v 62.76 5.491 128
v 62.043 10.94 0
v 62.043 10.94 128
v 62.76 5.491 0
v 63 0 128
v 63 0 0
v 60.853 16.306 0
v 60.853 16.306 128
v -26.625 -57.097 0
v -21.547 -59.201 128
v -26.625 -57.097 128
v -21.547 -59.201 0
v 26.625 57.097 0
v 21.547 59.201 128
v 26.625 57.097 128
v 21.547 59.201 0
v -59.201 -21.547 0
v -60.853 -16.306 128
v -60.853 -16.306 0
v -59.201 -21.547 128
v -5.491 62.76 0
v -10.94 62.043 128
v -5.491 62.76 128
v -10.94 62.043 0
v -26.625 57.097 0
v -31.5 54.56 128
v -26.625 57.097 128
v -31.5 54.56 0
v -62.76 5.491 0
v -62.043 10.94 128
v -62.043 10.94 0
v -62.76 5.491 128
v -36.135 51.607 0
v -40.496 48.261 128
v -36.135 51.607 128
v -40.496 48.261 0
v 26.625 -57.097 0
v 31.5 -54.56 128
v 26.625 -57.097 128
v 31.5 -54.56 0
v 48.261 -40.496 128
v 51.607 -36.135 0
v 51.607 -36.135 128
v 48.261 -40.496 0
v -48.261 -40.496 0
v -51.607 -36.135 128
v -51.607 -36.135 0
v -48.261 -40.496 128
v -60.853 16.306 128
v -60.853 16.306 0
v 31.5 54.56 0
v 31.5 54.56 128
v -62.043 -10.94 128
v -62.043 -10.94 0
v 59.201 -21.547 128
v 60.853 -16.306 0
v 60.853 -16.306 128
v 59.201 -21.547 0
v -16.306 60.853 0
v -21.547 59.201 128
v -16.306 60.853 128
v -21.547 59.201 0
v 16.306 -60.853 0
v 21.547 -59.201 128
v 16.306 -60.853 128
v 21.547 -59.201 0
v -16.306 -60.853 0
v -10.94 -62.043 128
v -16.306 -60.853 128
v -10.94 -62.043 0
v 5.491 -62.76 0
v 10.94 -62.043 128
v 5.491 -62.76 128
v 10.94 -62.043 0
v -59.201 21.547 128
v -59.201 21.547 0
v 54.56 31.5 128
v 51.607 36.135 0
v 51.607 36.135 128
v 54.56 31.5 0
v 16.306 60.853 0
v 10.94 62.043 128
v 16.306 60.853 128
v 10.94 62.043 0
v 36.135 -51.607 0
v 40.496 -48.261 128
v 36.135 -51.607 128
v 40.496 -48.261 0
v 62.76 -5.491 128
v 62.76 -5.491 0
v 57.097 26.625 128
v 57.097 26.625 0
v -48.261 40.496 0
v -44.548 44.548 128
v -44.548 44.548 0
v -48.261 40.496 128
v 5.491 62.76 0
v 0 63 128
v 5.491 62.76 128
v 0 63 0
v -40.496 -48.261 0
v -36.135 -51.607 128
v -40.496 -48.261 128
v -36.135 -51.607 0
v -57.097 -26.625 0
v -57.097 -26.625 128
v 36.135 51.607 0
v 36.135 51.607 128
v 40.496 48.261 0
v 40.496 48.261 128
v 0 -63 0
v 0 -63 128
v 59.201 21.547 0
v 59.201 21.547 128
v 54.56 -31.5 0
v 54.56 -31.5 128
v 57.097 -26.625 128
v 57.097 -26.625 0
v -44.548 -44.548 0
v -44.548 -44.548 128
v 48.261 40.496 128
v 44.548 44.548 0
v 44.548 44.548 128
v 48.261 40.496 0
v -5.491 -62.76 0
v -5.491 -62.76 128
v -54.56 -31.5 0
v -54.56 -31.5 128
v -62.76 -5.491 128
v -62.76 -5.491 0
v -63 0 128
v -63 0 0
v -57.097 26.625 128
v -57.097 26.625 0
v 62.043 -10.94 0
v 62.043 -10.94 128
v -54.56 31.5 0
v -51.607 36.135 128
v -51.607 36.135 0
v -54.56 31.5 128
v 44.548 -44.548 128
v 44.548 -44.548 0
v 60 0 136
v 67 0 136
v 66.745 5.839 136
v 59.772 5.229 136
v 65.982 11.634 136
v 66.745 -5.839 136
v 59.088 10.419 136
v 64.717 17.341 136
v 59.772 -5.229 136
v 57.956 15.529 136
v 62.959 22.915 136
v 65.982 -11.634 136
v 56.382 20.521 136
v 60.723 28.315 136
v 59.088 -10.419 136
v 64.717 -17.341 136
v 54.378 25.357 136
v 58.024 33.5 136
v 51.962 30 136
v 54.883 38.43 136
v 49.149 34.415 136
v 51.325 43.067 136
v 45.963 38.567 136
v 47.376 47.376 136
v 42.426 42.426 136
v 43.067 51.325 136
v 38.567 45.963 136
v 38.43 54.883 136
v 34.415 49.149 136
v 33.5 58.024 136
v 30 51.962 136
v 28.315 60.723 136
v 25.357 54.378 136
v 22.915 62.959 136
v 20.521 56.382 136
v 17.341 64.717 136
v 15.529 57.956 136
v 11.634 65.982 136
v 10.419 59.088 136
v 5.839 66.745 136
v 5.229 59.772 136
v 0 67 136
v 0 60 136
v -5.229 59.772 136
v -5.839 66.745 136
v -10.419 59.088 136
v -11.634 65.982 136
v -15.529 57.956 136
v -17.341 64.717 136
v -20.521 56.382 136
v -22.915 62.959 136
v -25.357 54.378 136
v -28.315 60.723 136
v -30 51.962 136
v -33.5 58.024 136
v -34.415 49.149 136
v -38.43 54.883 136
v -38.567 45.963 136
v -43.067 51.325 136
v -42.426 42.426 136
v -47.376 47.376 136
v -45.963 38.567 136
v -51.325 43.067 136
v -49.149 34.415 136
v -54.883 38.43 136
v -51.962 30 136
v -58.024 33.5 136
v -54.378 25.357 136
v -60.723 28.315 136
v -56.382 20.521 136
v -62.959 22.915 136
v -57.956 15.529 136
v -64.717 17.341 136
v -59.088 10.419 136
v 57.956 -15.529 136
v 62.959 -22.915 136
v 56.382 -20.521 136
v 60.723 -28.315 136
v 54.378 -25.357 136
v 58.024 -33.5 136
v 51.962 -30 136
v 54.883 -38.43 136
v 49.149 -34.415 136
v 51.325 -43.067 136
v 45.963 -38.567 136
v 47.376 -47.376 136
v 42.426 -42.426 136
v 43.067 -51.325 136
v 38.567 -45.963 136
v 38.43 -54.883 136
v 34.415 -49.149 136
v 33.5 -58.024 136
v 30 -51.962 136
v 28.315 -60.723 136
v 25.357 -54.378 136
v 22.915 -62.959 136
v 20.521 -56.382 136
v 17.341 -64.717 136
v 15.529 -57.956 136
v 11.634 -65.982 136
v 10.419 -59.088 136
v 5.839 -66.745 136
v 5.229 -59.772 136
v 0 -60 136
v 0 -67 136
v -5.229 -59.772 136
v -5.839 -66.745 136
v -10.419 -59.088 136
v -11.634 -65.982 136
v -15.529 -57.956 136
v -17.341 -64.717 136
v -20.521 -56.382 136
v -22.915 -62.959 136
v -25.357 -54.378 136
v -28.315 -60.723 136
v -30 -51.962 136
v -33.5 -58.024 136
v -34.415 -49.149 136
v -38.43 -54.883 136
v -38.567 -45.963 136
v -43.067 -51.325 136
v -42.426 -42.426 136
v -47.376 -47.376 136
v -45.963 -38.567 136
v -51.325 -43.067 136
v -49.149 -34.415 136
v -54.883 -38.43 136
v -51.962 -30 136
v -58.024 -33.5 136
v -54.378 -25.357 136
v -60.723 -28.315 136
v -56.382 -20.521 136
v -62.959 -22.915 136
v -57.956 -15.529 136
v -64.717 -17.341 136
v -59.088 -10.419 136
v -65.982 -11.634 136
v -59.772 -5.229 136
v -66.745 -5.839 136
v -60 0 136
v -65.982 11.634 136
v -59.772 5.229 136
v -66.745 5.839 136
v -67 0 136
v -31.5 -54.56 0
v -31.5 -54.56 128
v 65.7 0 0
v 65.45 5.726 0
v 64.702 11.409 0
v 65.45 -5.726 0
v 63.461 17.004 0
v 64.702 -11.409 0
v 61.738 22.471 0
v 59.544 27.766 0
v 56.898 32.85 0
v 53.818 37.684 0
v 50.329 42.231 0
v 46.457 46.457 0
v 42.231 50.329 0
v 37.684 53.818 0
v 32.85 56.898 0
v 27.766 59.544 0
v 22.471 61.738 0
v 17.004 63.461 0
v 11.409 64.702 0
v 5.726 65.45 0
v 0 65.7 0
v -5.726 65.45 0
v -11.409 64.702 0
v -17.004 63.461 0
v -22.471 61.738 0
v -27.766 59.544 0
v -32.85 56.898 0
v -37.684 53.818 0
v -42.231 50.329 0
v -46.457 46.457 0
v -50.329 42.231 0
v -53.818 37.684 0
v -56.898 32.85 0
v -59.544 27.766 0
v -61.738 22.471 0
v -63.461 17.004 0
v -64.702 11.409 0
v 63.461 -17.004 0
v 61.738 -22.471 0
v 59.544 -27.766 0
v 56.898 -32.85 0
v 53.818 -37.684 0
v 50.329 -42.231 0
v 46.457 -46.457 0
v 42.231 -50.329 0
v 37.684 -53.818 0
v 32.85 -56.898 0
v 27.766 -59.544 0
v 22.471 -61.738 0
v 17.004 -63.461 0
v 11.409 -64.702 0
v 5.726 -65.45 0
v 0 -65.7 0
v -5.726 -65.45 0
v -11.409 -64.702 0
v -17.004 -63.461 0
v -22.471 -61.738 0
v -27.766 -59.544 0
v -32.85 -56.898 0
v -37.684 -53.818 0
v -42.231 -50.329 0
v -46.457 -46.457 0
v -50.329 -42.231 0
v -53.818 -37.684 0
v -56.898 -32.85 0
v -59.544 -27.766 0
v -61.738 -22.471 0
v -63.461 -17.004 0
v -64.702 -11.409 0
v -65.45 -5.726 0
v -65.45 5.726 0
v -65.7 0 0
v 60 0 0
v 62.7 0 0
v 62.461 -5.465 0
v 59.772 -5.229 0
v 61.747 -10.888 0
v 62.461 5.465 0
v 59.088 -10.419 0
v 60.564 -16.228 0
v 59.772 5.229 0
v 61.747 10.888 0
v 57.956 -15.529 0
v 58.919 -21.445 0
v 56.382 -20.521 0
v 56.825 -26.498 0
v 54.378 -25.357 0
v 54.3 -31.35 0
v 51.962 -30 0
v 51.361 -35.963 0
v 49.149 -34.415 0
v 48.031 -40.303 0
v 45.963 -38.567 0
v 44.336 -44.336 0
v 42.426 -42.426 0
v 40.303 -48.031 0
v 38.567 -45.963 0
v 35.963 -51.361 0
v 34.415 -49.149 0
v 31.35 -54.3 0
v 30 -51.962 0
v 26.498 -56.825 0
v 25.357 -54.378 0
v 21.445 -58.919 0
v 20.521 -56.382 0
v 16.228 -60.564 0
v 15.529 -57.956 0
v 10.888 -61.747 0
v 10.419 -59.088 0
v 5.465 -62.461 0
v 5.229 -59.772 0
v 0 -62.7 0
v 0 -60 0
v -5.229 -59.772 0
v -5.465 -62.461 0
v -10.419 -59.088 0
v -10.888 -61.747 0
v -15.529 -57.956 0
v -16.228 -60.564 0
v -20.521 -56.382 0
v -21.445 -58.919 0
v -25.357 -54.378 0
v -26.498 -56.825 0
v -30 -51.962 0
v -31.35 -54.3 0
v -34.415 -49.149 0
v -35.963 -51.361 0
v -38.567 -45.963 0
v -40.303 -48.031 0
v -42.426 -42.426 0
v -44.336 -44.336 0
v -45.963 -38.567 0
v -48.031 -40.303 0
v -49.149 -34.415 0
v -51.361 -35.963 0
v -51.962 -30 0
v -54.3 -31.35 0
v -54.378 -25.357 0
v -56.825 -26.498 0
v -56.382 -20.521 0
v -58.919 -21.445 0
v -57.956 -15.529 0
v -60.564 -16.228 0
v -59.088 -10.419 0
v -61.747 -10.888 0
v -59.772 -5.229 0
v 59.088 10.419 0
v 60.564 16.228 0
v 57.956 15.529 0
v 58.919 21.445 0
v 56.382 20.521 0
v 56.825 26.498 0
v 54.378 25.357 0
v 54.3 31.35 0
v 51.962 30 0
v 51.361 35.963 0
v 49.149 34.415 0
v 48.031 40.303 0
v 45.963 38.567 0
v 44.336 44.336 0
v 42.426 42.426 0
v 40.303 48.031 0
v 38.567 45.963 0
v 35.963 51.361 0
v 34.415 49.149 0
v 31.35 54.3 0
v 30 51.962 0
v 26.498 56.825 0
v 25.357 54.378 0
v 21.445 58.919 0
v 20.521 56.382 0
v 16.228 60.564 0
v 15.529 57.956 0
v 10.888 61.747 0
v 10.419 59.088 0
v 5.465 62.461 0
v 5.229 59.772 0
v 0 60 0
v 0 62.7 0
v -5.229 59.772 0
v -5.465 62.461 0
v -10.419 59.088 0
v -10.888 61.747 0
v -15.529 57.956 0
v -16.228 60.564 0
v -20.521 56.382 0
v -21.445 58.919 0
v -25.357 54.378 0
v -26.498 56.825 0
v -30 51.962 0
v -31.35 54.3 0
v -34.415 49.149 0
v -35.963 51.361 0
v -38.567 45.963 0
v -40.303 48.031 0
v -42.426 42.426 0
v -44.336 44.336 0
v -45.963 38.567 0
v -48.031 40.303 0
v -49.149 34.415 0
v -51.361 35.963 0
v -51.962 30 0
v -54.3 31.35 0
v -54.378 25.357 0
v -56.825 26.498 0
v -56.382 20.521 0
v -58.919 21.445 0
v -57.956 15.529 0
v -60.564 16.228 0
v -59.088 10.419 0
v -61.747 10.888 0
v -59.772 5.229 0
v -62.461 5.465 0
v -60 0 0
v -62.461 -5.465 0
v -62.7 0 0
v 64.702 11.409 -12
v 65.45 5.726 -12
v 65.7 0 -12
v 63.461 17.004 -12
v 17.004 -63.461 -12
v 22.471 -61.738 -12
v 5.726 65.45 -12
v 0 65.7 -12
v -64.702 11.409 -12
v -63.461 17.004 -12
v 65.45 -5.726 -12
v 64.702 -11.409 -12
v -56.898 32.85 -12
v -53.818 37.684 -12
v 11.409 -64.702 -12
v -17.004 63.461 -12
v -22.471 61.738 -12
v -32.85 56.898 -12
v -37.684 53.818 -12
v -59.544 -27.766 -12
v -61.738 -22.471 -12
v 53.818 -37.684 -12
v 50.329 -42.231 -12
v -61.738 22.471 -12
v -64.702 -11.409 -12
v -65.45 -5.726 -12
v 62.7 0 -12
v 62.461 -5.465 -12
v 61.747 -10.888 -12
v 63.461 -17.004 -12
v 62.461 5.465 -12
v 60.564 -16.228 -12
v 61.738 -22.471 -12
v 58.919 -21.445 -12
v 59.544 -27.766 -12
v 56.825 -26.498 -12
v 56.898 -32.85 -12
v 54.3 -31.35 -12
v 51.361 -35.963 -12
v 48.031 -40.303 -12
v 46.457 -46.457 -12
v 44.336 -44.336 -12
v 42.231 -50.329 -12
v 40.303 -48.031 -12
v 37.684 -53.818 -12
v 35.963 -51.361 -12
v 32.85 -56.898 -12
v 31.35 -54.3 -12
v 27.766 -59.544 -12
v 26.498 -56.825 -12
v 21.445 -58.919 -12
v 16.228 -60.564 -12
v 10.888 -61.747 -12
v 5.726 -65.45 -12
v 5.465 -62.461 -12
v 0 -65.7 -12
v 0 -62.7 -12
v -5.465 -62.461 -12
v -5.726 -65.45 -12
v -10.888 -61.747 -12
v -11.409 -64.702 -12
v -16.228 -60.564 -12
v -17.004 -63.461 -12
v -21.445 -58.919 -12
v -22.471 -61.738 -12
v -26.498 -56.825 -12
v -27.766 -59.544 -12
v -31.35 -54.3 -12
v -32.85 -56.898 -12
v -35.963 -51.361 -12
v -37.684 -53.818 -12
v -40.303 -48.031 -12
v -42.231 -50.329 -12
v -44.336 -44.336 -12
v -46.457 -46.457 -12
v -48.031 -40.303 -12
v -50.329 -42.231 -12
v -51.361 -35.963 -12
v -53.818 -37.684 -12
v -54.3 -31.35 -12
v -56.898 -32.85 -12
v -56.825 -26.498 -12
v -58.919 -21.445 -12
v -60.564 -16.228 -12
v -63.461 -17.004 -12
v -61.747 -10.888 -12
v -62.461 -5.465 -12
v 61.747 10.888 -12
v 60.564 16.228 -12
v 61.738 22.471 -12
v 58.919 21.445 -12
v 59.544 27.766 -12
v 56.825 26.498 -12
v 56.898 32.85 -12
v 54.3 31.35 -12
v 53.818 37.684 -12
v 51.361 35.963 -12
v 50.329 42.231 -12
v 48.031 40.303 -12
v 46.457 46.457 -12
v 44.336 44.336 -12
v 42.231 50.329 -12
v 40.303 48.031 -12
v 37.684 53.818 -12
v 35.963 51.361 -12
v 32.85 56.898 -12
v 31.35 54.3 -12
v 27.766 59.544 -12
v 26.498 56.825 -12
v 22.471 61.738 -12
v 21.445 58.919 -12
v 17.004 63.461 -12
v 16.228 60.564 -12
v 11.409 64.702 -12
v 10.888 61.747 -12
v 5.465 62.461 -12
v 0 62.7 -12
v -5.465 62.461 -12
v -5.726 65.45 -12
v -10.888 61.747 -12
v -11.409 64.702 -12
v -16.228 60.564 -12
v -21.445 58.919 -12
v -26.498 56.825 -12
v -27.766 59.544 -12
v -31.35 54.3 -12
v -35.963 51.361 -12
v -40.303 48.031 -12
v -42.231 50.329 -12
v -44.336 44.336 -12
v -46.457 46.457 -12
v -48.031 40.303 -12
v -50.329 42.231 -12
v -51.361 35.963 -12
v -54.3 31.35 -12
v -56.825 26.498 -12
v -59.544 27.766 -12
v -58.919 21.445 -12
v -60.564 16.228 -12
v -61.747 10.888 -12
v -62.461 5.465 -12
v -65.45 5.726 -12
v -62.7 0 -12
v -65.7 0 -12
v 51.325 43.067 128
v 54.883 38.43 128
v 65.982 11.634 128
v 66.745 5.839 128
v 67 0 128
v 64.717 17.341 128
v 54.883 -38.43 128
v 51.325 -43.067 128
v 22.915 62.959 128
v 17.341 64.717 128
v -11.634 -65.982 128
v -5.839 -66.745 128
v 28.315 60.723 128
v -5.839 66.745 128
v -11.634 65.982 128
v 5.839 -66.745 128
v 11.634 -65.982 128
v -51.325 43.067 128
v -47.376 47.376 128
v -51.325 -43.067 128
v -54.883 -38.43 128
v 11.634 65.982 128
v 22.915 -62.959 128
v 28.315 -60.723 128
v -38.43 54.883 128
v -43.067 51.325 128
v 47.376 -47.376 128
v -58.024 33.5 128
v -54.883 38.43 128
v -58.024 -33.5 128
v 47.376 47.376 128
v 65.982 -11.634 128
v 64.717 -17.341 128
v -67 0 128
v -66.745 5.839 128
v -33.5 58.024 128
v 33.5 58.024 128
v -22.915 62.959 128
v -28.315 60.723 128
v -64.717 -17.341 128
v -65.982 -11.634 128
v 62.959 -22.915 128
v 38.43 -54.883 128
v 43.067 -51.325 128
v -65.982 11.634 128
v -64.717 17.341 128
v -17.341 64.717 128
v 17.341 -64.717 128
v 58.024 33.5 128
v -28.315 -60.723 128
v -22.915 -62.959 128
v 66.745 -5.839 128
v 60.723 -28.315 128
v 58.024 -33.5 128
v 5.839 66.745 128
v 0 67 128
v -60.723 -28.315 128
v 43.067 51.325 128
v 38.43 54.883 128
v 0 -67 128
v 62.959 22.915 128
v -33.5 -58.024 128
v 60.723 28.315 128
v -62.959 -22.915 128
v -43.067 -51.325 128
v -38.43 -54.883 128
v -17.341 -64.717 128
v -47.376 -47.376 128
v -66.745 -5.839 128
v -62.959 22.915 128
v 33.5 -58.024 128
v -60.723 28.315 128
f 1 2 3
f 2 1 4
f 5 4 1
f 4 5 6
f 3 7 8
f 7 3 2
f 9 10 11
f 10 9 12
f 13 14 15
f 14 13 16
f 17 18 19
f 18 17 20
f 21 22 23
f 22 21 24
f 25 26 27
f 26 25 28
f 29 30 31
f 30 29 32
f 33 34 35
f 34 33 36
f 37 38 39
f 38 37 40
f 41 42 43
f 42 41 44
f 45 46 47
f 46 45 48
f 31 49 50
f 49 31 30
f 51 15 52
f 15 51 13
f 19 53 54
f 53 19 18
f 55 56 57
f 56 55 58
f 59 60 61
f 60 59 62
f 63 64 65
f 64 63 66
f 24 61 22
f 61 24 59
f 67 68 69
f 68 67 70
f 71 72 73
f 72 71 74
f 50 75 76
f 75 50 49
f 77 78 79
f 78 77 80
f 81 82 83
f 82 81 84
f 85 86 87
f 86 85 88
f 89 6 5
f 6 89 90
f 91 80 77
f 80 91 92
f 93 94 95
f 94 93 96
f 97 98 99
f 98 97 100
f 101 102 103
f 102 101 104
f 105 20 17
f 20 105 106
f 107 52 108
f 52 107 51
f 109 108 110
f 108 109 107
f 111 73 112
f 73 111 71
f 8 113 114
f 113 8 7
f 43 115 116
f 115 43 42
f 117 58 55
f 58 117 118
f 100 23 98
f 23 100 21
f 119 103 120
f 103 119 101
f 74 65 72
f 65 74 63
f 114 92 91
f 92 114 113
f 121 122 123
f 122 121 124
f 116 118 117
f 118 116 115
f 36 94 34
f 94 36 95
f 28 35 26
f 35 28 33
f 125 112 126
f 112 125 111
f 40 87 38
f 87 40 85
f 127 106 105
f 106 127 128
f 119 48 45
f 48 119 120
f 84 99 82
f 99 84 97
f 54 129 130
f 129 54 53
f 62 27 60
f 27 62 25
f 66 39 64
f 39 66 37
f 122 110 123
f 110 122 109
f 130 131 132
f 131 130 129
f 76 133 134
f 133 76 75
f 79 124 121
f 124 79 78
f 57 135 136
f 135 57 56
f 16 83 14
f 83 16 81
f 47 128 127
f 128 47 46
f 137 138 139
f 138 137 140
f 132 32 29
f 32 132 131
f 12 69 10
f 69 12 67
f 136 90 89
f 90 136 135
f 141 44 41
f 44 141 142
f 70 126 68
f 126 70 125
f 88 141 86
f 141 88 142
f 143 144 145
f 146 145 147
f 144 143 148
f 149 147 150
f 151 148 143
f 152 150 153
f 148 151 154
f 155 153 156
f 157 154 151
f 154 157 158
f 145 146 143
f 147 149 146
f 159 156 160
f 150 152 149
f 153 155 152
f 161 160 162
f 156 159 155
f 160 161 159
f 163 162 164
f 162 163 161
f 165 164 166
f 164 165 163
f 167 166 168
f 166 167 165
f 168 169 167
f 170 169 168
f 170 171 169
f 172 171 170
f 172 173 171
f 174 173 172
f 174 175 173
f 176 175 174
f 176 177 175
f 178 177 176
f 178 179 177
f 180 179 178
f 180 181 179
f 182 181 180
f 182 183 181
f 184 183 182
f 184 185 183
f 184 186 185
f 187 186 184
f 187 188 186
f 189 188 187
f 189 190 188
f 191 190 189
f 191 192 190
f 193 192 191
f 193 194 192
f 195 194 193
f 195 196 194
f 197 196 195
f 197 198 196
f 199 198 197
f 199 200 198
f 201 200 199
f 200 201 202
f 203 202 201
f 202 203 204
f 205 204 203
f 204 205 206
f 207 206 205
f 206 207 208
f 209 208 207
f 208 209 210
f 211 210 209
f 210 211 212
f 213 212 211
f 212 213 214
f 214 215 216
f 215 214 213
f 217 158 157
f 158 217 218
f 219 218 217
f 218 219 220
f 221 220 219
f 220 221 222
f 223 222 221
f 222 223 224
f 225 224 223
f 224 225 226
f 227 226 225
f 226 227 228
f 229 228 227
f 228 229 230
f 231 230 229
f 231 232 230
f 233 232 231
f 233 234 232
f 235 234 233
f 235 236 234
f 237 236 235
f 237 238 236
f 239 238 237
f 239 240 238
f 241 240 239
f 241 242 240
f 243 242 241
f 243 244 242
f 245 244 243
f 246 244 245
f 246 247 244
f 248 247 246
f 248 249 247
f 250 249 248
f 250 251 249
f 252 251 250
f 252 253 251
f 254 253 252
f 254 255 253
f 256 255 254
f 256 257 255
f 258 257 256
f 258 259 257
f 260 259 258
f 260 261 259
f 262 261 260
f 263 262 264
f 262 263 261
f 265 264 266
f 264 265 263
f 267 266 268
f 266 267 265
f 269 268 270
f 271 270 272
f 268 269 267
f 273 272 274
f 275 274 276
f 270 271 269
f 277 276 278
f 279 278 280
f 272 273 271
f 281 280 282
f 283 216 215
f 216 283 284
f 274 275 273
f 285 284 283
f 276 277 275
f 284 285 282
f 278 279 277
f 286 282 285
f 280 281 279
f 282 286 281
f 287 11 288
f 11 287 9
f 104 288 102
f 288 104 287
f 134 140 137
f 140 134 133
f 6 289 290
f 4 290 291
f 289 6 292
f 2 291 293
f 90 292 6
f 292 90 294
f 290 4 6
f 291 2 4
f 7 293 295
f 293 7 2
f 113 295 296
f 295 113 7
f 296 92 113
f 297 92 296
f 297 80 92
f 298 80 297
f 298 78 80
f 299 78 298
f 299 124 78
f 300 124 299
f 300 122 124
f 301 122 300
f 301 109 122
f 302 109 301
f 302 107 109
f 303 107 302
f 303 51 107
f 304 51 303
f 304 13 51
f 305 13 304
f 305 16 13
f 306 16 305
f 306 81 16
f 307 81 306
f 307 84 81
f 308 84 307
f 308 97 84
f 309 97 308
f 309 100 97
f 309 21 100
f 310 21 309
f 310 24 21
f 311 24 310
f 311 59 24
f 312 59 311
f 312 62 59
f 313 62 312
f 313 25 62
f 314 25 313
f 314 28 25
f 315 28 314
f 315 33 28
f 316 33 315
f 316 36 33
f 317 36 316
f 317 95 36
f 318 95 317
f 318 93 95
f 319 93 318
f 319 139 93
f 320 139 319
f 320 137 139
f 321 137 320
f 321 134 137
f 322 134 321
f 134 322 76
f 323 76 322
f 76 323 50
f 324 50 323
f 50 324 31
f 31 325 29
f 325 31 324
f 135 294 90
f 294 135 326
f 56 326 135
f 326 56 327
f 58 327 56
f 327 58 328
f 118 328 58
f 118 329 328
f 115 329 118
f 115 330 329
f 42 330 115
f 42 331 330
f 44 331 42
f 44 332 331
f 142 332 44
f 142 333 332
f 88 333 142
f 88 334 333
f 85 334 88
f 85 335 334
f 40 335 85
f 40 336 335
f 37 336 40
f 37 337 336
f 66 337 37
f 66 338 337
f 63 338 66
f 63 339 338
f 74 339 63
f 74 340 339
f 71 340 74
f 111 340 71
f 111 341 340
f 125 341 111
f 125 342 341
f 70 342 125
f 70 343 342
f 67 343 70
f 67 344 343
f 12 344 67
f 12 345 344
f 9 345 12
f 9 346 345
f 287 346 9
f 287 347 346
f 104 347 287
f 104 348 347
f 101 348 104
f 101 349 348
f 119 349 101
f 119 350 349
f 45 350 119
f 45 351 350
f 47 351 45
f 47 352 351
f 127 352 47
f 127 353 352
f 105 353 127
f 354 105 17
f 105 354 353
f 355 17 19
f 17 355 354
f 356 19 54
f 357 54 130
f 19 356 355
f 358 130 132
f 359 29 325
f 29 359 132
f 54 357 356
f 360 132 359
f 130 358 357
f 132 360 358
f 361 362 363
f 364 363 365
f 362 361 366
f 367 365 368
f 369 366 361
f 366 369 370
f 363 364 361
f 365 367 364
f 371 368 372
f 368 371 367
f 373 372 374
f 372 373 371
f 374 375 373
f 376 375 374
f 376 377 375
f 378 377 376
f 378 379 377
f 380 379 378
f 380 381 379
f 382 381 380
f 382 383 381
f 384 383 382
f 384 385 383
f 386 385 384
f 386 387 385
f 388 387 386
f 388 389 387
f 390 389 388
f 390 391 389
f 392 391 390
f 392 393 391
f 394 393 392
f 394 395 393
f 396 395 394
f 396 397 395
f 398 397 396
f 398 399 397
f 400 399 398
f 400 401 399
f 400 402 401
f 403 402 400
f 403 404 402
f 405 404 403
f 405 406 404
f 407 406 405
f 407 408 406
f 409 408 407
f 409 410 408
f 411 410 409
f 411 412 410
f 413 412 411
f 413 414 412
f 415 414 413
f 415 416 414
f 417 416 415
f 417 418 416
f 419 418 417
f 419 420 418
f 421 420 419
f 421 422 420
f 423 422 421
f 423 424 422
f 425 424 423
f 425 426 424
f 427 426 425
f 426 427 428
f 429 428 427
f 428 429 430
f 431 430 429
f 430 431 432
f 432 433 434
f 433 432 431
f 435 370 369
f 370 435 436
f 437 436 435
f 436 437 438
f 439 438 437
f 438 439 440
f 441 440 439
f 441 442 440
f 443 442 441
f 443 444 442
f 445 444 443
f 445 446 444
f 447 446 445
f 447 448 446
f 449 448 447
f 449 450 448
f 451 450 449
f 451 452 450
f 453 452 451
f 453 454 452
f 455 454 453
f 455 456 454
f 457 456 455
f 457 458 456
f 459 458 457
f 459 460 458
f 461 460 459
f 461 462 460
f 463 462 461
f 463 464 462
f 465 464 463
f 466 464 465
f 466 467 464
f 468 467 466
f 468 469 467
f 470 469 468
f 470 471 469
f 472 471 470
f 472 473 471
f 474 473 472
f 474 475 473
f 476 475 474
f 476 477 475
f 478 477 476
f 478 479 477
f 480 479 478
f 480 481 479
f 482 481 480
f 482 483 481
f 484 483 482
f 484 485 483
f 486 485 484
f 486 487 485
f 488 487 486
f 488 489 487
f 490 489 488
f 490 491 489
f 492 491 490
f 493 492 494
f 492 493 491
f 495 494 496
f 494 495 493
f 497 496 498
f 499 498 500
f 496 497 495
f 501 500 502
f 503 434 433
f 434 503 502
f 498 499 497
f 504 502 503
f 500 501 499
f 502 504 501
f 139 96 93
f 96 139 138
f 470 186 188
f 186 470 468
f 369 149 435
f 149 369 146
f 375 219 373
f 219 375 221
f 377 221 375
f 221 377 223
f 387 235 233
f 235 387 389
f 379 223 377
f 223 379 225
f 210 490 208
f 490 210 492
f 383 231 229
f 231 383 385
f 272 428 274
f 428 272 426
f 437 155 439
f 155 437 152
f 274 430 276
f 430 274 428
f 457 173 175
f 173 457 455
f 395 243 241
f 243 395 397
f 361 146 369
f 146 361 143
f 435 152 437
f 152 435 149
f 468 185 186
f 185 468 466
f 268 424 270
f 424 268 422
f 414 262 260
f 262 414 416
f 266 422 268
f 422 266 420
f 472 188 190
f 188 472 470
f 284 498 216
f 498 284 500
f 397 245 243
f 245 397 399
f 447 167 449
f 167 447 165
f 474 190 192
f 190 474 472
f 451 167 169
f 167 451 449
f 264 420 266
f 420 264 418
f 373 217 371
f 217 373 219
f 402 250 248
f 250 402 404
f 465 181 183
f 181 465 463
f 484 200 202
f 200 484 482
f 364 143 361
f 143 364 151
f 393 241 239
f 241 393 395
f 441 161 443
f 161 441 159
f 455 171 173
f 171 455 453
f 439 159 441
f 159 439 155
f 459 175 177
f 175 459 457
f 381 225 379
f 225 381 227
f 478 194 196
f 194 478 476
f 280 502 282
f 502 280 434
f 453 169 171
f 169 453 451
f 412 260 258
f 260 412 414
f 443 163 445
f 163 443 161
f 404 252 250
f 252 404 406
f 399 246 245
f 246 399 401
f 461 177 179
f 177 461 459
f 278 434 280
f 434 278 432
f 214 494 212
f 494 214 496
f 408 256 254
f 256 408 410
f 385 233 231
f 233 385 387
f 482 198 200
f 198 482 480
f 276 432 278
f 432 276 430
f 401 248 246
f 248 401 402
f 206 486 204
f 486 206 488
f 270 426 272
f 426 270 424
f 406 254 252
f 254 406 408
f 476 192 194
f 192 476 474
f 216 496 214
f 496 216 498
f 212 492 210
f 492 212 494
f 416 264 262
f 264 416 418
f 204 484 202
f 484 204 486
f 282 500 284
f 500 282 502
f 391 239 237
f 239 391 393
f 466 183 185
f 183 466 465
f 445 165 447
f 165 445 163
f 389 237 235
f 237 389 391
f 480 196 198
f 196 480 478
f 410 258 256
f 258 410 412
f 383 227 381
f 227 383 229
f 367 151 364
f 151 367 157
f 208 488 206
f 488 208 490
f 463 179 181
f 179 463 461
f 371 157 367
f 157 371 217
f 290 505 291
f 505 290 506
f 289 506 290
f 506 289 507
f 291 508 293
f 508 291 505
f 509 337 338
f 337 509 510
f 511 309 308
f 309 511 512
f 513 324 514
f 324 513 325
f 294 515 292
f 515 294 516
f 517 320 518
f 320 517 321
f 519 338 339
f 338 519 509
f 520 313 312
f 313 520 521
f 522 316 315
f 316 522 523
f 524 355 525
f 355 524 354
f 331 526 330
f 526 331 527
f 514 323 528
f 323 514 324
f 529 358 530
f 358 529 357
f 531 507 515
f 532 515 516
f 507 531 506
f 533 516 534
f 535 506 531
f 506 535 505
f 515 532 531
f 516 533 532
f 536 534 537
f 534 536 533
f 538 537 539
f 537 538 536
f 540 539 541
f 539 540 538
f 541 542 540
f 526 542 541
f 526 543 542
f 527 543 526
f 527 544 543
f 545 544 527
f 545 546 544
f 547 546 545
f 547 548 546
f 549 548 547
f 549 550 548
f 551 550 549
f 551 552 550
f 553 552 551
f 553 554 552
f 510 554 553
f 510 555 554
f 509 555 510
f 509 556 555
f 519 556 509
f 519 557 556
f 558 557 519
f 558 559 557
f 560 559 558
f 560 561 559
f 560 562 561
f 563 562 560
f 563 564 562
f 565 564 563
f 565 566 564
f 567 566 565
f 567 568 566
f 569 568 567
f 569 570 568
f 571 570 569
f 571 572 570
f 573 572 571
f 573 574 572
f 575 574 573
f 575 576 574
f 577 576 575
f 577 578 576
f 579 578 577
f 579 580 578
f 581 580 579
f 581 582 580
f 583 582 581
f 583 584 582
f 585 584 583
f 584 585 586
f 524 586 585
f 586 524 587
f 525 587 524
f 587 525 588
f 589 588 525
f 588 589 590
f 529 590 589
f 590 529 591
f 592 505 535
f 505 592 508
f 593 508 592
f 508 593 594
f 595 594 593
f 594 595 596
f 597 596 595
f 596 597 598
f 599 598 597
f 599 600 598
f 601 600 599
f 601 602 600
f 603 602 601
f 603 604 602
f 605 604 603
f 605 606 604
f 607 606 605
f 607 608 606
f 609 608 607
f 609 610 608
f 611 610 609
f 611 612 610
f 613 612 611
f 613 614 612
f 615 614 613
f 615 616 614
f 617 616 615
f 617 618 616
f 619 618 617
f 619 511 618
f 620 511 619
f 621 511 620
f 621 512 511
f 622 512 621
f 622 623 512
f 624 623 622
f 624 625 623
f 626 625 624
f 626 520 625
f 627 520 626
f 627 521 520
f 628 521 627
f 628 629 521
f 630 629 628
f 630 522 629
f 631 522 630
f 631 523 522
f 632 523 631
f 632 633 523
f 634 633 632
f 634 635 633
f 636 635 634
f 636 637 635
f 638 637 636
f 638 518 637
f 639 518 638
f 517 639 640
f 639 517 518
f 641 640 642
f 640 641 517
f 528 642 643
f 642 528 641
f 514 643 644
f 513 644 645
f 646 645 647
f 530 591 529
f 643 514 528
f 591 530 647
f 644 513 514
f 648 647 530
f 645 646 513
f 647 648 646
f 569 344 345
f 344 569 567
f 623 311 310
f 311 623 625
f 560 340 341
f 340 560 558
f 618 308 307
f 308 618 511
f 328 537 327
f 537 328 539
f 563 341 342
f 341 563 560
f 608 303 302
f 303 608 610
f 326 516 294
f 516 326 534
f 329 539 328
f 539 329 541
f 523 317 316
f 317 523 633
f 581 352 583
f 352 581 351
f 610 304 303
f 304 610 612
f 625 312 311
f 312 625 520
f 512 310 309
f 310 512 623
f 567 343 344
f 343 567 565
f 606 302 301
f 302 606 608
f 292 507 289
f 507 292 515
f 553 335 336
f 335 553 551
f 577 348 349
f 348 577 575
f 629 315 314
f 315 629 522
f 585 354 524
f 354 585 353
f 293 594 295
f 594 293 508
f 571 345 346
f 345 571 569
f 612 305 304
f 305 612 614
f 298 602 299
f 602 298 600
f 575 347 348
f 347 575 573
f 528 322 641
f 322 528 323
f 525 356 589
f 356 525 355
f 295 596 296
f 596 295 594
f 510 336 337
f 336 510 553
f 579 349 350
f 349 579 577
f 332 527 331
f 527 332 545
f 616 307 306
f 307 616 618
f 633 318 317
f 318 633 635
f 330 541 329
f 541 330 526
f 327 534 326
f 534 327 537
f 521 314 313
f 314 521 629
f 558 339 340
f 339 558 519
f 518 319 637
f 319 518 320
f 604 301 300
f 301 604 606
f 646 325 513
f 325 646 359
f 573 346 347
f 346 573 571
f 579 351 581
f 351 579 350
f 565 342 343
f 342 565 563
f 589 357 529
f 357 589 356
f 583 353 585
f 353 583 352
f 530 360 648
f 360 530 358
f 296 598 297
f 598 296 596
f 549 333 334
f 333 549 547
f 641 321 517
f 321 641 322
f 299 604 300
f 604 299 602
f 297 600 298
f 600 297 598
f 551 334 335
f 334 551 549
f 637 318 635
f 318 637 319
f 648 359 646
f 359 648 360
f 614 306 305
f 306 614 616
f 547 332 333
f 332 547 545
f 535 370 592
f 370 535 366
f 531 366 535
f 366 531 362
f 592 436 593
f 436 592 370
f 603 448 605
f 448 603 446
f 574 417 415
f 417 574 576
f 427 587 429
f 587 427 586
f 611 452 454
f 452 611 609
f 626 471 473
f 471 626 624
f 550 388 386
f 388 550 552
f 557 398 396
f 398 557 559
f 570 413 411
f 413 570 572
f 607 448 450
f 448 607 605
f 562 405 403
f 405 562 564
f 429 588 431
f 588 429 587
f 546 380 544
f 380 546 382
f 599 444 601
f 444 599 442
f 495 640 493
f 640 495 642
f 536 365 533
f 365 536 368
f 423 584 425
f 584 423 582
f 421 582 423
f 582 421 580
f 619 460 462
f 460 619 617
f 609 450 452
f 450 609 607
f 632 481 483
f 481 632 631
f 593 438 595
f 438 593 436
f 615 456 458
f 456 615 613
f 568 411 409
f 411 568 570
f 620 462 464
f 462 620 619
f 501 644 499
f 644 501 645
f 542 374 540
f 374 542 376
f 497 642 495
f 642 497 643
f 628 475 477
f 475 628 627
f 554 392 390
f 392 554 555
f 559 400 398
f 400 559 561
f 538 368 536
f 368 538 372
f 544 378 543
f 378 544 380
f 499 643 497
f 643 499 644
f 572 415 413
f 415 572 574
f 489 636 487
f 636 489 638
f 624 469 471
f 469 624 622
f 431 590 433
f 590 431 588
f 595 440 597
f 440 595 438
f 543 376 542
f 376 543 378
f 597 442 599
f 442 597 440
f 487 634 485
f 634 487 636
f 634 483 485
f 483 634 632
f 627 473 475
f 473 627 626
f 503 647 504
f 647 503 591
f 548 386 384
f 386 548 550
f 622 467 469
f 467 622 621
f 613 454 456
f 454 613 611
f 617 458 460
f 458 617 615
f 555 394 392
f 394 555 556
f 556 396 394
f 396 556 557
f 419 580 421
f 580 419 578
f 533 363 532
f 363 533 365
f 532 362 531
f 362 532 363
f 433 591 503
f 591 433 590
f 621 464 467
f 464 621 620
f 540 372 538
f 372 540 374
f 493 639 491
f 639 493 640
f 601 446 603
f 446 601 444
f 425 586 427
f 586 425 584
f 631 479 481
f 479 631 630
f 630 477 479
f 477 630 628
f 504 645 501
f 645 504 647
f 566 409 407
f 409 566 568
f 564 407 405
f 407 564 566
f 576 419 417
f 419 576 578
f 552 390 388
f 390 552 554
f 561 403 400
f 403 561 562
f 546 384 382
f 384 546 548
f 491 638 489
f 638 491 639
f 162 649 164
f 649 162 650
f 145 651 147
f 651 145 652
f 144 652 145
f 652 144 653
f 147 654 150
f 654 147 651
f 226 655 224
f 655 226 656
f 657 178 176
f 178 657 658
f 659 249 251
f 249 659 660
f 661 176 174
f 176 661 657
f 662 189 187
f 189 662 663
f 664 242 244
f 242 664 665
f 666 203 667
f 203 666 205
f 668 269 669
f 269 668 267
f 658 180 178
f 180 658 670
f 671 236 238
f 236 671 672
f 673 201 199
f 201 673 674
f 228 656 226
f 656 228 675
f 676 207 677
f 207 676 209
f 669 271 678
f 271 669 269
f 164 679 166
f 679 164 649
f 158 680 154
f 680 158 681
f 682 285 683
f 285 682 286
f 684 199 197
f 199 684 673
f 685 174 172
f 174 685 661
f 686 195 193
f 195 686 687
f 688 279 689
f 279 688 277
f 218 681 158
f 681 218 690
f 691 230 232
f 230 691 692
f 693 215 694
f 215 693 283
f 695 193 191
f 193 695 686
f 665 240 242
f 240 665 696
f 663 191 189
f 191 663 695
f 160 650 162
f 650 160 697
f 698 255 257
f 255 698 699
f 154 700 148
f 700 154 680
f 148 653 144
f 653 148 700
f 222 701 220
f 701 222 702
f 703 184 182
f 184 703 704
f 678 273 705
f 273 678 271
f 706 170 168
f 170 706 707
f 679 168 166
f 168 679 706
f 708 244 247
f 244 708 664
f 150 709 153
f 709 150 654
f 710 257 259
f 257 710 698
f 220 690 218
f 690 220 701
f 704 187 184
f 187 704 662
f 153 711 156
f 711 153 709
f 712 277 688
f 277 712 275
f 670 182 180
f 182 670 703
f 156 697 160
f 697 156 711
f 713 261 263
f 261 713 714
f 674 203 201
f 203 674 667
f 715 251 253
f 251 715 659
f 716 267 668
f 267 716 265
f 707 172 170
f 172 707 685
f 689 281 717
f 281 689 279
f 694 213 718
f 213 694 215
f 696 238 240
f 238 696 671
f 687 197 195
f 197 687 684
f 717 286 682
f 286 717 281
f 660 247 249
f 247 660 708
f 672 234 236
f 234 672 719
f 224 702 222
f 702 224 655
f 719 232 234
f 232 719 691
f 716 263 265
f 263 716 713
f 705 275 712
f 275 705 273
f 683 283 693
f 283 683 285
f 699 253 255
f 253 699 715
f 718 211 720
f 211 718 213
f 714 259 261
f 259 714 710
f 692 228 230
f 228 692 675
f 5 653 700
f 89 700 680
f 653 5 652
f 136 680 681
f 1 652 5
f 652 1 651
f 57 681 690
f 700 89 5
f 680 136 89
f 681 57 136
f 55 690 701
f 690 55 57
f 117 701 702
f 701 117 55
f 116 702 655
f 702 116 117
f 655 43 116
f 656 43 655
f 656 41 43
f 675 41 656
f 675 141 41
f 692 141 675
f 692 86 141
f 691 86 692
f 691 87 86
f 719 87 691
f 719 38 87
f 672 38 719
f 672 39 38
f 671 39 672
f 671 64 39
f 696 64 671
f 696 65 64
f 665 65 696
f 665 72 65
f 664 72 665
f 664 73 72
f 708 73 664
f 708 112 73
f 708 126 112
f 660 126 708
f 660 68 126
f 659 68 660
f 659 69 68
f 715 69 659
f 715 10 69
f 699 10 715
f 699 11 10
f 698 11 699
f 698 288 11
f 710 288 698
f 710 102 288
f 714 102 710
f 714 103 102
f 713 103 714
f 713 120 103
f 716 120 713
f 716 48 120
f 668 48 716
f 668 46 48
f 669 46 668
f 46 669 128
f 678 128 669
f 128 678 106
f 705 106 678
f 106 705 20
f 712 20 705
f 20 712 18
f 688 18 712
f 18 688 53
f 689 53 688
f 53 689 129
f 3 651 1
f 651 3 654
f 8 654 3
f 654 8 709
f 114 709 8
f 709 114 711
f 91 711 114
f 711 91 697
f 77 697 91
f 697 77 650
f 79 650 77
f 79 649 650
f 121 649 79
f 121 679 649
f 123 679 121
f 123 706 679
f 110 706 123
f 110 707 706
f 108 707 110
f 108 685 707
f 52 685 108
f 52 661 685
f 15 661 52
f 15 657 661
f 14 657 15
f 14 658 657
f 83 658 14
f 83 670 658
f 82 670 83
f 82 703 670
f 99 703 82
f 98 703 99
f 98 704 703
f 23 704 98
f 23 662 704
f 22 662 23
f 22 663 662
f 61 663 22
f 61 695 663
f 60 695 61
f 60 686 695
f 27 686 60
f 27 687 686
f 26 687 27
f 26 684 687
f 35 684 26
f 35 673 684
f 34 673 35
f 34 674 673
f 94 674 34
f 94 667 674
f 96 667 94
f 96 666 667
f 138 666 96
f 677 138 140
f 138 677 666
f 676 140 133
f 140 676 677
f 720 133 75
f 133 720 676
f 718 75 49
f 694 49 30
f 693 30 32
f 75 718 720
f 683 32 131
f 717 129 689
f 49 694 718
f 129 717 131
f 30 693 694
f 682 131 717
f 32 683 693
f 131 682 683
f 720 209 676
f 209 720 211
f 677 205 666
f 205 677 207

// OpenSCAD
// ===========================================================================
// HULL-FRAME COORDINATE STANDARD - Rev R1 (2026-06-11).  See CLAUDE.md.
//   Hull frame (canonical for ALL design artifacts): X = +port (left),
//   Y = +aft (back), Z = +dorsal (up); origin = SerenityAssembly.FCStd
//   world origin.  Primary-component STLs published to airframe/stls/
//   are stored directly in hull frame, baked by tools/bake_hull_frame.py
//   (marker 'SerenityUAV HULL-FRAME R1' in the binary STL header).
//   NEVER re-bake a mesh derived from an already-baked file.
//   This file:
//     Part-local frame.  DEFERRED - Phase 11 (aft fuselage EDF).  On
//     integration, position in hull frame per the validated assembly and
//     bake or place explicitly; stations quoted from nose convert to hull
//     Y via nose tip at hull Y = -305.6 mm.
// ===========================================================================
// s_edf_120_thrust_tube.scad
// Thrust tube for Serenity Rev N 120mm rear EDF.
//
// Remixed from Thingiverse thing:2838324 (120mm fuselage EDF).
// This tube channels exhaust from the EDF exit face through the
// aft fuselage (station ~440mm) to the rear iris nozzle (station ~600mm).
//
// Coordinate system: +Z = aft (exhaust direction).
// Z=0 = forward face of thrust tube (mates to EDF casing aft lip / motor mount ring).
// Z=TUBE_L = aft bonding face (mates to rear_nozzle_frame.stl base ring).
//
// Integration interfaces:
//   Forward (Z=0):     forward spigot ID = EDF casing OD; locates tube on EDF exit.
//   Aft (Z=TUBE_L):    bonding flange ring bonds to rear_nozzle_frame.stl base.
//
// Station reference (world X coordinates of s_rear_shell24_2mm_repaired.stl):
//   EDF exhaust face at X ≈ -90 mm (in cargo section, per plenum design).
//   Nozzle frame shoulder at X = -226 mm (= aft face -246 + seat depth 20).
//   Required span: 226 - 90 = 136 mm → TUBE_L = 136 mm.
//
//   Rev B (2026-06-02): corrected TUBE_L from 155 mm to 136 mm.
//   Previous value was 19 mm too long; tube end overshot the nozzle shoulder.
//
// Print: PETG, 0.20mm layers, 20% gyroid infill.
// Note: orient with tube axis vertical on printer for best layer adhesion.
// No support required if printed tube-axis vertical.

// ── Geometry parameters ────────────────────────────────────────────────────

BORE_ID      = 120;   // [mm] internal bore (matches EDF fan bore)
WALL         =   3;   // [mm] tube wall thickness → OD = BORE_ID + 2×WALL
TUBE_L       = 136;   // [mm] total tube length (EDF exhaust X≈-90 to nozzle shoulder X=-226)

// Forward spigot: thin sleeve that slips over the EDF casing aft OD
// The EDF casing outer diameter is nominally ~125mm (varies by brand);
// adjust SPIGOT_ID if your 120mm EDF casing OD differs.
EDF_CASING_OD = 125;  // [mm] EDF casing outer diameter — adjust to match actual unit
SPIGOT_ID     = EDF_CASING_OD + 0.4; // slip-fit clearance
SPIGOT_WALL   =   3;  // [mm] spigot sleeve wall
SPIGOT_L      =  12;  // [mm] spigot engagement length (overlaps EDF casing)

// Aft bonding flange: widens to grip against rear_nozzle_frame.stl base ring.
// rear_nozzle_frame base ring inner bore is assumed ~128mm — verify in slicer.
FLANGE_OD     = 134;  // [mm] bonding flange outer diameter
FLANGE_L      =   8;  // [mm] axial depth of bonding flange

// Lightening slots in tube wall (optional aero/mass reduction — set to 0 to disable)
SLOT_COUNT    =   0;  // number of axial slots in tube wall (0 = solid tube)
SLOT_W        =   8;  // [mm] slot width
SLOT_L        = 100;  // [mm] slot length (centred on tube)

$fn = 72;

// ── Derived values ─────────────────────────────────────────────────────────

TUBE_OD = BORE_ID + 2 * WALL;          // = 126mm
SPIGOT_OD = SPIGOT_ID + 2 * SPIGOT_WALL;

// ── Modules ────────────────────────────────────────────────────────────────

module main_tube() {
    difference() {
        cylinder(h = TUBE_L, r = TUBE_OD / 2);
        // bore
        translate([0, 0, -0.5])
            cylinder(h = TUBE_L + 1, r = BORE_ID / 2);
        // axial lightening slots
        if (SLOT_COUNT > 0)
            for (i = [0 : SLOT_COUNT - 1])
                rotate([0, 0, i * 360 / SLOT_COUNT])
                translate([TUBE_OD / 2 - WALL / 2, 0, TUBE_L / 2])
                    cube([WALL + 1, SLOT_W, SLOT_L], center = true);
    }
}

module forward_spigot() {
    // sleeve at Z=0 end that overlaps EDF casing aft lip
    difference() {
        cylinder(h = SPIGOT_L, r = SPIGOT_OD / 2);
        // inner bore clears EDF casing
        translate([0, 0, -0.5])
            cylinder(h = SPIGOT_L + 1, r = SPIGOT_ID / 2);
    }
}

module aft_bonding_flange() {
    // thickened ring at aft end for epoxy bond to rear_nozzle_frame base ring
    translate([0, 0, TUBE_L - FLANGE_L])
    difference() {
        cylinder(h = FLANGE_L, r = FLANGE_OD / 2);
        translate([0, 0, -0.5])
            cylinder(h = FLANGE_L + 1, r = BORE_ID / 2);
    }
}

// ── Assembly ───────────────────────────────────────────────────────────────

union() {
    main_tube();
    // forward spigot protrudes in the −Z direction (over EDF casing)
    translate([0, 0, -SPIGOT_L])
        forward_spigot();
    aft_bonding_flange();
}
